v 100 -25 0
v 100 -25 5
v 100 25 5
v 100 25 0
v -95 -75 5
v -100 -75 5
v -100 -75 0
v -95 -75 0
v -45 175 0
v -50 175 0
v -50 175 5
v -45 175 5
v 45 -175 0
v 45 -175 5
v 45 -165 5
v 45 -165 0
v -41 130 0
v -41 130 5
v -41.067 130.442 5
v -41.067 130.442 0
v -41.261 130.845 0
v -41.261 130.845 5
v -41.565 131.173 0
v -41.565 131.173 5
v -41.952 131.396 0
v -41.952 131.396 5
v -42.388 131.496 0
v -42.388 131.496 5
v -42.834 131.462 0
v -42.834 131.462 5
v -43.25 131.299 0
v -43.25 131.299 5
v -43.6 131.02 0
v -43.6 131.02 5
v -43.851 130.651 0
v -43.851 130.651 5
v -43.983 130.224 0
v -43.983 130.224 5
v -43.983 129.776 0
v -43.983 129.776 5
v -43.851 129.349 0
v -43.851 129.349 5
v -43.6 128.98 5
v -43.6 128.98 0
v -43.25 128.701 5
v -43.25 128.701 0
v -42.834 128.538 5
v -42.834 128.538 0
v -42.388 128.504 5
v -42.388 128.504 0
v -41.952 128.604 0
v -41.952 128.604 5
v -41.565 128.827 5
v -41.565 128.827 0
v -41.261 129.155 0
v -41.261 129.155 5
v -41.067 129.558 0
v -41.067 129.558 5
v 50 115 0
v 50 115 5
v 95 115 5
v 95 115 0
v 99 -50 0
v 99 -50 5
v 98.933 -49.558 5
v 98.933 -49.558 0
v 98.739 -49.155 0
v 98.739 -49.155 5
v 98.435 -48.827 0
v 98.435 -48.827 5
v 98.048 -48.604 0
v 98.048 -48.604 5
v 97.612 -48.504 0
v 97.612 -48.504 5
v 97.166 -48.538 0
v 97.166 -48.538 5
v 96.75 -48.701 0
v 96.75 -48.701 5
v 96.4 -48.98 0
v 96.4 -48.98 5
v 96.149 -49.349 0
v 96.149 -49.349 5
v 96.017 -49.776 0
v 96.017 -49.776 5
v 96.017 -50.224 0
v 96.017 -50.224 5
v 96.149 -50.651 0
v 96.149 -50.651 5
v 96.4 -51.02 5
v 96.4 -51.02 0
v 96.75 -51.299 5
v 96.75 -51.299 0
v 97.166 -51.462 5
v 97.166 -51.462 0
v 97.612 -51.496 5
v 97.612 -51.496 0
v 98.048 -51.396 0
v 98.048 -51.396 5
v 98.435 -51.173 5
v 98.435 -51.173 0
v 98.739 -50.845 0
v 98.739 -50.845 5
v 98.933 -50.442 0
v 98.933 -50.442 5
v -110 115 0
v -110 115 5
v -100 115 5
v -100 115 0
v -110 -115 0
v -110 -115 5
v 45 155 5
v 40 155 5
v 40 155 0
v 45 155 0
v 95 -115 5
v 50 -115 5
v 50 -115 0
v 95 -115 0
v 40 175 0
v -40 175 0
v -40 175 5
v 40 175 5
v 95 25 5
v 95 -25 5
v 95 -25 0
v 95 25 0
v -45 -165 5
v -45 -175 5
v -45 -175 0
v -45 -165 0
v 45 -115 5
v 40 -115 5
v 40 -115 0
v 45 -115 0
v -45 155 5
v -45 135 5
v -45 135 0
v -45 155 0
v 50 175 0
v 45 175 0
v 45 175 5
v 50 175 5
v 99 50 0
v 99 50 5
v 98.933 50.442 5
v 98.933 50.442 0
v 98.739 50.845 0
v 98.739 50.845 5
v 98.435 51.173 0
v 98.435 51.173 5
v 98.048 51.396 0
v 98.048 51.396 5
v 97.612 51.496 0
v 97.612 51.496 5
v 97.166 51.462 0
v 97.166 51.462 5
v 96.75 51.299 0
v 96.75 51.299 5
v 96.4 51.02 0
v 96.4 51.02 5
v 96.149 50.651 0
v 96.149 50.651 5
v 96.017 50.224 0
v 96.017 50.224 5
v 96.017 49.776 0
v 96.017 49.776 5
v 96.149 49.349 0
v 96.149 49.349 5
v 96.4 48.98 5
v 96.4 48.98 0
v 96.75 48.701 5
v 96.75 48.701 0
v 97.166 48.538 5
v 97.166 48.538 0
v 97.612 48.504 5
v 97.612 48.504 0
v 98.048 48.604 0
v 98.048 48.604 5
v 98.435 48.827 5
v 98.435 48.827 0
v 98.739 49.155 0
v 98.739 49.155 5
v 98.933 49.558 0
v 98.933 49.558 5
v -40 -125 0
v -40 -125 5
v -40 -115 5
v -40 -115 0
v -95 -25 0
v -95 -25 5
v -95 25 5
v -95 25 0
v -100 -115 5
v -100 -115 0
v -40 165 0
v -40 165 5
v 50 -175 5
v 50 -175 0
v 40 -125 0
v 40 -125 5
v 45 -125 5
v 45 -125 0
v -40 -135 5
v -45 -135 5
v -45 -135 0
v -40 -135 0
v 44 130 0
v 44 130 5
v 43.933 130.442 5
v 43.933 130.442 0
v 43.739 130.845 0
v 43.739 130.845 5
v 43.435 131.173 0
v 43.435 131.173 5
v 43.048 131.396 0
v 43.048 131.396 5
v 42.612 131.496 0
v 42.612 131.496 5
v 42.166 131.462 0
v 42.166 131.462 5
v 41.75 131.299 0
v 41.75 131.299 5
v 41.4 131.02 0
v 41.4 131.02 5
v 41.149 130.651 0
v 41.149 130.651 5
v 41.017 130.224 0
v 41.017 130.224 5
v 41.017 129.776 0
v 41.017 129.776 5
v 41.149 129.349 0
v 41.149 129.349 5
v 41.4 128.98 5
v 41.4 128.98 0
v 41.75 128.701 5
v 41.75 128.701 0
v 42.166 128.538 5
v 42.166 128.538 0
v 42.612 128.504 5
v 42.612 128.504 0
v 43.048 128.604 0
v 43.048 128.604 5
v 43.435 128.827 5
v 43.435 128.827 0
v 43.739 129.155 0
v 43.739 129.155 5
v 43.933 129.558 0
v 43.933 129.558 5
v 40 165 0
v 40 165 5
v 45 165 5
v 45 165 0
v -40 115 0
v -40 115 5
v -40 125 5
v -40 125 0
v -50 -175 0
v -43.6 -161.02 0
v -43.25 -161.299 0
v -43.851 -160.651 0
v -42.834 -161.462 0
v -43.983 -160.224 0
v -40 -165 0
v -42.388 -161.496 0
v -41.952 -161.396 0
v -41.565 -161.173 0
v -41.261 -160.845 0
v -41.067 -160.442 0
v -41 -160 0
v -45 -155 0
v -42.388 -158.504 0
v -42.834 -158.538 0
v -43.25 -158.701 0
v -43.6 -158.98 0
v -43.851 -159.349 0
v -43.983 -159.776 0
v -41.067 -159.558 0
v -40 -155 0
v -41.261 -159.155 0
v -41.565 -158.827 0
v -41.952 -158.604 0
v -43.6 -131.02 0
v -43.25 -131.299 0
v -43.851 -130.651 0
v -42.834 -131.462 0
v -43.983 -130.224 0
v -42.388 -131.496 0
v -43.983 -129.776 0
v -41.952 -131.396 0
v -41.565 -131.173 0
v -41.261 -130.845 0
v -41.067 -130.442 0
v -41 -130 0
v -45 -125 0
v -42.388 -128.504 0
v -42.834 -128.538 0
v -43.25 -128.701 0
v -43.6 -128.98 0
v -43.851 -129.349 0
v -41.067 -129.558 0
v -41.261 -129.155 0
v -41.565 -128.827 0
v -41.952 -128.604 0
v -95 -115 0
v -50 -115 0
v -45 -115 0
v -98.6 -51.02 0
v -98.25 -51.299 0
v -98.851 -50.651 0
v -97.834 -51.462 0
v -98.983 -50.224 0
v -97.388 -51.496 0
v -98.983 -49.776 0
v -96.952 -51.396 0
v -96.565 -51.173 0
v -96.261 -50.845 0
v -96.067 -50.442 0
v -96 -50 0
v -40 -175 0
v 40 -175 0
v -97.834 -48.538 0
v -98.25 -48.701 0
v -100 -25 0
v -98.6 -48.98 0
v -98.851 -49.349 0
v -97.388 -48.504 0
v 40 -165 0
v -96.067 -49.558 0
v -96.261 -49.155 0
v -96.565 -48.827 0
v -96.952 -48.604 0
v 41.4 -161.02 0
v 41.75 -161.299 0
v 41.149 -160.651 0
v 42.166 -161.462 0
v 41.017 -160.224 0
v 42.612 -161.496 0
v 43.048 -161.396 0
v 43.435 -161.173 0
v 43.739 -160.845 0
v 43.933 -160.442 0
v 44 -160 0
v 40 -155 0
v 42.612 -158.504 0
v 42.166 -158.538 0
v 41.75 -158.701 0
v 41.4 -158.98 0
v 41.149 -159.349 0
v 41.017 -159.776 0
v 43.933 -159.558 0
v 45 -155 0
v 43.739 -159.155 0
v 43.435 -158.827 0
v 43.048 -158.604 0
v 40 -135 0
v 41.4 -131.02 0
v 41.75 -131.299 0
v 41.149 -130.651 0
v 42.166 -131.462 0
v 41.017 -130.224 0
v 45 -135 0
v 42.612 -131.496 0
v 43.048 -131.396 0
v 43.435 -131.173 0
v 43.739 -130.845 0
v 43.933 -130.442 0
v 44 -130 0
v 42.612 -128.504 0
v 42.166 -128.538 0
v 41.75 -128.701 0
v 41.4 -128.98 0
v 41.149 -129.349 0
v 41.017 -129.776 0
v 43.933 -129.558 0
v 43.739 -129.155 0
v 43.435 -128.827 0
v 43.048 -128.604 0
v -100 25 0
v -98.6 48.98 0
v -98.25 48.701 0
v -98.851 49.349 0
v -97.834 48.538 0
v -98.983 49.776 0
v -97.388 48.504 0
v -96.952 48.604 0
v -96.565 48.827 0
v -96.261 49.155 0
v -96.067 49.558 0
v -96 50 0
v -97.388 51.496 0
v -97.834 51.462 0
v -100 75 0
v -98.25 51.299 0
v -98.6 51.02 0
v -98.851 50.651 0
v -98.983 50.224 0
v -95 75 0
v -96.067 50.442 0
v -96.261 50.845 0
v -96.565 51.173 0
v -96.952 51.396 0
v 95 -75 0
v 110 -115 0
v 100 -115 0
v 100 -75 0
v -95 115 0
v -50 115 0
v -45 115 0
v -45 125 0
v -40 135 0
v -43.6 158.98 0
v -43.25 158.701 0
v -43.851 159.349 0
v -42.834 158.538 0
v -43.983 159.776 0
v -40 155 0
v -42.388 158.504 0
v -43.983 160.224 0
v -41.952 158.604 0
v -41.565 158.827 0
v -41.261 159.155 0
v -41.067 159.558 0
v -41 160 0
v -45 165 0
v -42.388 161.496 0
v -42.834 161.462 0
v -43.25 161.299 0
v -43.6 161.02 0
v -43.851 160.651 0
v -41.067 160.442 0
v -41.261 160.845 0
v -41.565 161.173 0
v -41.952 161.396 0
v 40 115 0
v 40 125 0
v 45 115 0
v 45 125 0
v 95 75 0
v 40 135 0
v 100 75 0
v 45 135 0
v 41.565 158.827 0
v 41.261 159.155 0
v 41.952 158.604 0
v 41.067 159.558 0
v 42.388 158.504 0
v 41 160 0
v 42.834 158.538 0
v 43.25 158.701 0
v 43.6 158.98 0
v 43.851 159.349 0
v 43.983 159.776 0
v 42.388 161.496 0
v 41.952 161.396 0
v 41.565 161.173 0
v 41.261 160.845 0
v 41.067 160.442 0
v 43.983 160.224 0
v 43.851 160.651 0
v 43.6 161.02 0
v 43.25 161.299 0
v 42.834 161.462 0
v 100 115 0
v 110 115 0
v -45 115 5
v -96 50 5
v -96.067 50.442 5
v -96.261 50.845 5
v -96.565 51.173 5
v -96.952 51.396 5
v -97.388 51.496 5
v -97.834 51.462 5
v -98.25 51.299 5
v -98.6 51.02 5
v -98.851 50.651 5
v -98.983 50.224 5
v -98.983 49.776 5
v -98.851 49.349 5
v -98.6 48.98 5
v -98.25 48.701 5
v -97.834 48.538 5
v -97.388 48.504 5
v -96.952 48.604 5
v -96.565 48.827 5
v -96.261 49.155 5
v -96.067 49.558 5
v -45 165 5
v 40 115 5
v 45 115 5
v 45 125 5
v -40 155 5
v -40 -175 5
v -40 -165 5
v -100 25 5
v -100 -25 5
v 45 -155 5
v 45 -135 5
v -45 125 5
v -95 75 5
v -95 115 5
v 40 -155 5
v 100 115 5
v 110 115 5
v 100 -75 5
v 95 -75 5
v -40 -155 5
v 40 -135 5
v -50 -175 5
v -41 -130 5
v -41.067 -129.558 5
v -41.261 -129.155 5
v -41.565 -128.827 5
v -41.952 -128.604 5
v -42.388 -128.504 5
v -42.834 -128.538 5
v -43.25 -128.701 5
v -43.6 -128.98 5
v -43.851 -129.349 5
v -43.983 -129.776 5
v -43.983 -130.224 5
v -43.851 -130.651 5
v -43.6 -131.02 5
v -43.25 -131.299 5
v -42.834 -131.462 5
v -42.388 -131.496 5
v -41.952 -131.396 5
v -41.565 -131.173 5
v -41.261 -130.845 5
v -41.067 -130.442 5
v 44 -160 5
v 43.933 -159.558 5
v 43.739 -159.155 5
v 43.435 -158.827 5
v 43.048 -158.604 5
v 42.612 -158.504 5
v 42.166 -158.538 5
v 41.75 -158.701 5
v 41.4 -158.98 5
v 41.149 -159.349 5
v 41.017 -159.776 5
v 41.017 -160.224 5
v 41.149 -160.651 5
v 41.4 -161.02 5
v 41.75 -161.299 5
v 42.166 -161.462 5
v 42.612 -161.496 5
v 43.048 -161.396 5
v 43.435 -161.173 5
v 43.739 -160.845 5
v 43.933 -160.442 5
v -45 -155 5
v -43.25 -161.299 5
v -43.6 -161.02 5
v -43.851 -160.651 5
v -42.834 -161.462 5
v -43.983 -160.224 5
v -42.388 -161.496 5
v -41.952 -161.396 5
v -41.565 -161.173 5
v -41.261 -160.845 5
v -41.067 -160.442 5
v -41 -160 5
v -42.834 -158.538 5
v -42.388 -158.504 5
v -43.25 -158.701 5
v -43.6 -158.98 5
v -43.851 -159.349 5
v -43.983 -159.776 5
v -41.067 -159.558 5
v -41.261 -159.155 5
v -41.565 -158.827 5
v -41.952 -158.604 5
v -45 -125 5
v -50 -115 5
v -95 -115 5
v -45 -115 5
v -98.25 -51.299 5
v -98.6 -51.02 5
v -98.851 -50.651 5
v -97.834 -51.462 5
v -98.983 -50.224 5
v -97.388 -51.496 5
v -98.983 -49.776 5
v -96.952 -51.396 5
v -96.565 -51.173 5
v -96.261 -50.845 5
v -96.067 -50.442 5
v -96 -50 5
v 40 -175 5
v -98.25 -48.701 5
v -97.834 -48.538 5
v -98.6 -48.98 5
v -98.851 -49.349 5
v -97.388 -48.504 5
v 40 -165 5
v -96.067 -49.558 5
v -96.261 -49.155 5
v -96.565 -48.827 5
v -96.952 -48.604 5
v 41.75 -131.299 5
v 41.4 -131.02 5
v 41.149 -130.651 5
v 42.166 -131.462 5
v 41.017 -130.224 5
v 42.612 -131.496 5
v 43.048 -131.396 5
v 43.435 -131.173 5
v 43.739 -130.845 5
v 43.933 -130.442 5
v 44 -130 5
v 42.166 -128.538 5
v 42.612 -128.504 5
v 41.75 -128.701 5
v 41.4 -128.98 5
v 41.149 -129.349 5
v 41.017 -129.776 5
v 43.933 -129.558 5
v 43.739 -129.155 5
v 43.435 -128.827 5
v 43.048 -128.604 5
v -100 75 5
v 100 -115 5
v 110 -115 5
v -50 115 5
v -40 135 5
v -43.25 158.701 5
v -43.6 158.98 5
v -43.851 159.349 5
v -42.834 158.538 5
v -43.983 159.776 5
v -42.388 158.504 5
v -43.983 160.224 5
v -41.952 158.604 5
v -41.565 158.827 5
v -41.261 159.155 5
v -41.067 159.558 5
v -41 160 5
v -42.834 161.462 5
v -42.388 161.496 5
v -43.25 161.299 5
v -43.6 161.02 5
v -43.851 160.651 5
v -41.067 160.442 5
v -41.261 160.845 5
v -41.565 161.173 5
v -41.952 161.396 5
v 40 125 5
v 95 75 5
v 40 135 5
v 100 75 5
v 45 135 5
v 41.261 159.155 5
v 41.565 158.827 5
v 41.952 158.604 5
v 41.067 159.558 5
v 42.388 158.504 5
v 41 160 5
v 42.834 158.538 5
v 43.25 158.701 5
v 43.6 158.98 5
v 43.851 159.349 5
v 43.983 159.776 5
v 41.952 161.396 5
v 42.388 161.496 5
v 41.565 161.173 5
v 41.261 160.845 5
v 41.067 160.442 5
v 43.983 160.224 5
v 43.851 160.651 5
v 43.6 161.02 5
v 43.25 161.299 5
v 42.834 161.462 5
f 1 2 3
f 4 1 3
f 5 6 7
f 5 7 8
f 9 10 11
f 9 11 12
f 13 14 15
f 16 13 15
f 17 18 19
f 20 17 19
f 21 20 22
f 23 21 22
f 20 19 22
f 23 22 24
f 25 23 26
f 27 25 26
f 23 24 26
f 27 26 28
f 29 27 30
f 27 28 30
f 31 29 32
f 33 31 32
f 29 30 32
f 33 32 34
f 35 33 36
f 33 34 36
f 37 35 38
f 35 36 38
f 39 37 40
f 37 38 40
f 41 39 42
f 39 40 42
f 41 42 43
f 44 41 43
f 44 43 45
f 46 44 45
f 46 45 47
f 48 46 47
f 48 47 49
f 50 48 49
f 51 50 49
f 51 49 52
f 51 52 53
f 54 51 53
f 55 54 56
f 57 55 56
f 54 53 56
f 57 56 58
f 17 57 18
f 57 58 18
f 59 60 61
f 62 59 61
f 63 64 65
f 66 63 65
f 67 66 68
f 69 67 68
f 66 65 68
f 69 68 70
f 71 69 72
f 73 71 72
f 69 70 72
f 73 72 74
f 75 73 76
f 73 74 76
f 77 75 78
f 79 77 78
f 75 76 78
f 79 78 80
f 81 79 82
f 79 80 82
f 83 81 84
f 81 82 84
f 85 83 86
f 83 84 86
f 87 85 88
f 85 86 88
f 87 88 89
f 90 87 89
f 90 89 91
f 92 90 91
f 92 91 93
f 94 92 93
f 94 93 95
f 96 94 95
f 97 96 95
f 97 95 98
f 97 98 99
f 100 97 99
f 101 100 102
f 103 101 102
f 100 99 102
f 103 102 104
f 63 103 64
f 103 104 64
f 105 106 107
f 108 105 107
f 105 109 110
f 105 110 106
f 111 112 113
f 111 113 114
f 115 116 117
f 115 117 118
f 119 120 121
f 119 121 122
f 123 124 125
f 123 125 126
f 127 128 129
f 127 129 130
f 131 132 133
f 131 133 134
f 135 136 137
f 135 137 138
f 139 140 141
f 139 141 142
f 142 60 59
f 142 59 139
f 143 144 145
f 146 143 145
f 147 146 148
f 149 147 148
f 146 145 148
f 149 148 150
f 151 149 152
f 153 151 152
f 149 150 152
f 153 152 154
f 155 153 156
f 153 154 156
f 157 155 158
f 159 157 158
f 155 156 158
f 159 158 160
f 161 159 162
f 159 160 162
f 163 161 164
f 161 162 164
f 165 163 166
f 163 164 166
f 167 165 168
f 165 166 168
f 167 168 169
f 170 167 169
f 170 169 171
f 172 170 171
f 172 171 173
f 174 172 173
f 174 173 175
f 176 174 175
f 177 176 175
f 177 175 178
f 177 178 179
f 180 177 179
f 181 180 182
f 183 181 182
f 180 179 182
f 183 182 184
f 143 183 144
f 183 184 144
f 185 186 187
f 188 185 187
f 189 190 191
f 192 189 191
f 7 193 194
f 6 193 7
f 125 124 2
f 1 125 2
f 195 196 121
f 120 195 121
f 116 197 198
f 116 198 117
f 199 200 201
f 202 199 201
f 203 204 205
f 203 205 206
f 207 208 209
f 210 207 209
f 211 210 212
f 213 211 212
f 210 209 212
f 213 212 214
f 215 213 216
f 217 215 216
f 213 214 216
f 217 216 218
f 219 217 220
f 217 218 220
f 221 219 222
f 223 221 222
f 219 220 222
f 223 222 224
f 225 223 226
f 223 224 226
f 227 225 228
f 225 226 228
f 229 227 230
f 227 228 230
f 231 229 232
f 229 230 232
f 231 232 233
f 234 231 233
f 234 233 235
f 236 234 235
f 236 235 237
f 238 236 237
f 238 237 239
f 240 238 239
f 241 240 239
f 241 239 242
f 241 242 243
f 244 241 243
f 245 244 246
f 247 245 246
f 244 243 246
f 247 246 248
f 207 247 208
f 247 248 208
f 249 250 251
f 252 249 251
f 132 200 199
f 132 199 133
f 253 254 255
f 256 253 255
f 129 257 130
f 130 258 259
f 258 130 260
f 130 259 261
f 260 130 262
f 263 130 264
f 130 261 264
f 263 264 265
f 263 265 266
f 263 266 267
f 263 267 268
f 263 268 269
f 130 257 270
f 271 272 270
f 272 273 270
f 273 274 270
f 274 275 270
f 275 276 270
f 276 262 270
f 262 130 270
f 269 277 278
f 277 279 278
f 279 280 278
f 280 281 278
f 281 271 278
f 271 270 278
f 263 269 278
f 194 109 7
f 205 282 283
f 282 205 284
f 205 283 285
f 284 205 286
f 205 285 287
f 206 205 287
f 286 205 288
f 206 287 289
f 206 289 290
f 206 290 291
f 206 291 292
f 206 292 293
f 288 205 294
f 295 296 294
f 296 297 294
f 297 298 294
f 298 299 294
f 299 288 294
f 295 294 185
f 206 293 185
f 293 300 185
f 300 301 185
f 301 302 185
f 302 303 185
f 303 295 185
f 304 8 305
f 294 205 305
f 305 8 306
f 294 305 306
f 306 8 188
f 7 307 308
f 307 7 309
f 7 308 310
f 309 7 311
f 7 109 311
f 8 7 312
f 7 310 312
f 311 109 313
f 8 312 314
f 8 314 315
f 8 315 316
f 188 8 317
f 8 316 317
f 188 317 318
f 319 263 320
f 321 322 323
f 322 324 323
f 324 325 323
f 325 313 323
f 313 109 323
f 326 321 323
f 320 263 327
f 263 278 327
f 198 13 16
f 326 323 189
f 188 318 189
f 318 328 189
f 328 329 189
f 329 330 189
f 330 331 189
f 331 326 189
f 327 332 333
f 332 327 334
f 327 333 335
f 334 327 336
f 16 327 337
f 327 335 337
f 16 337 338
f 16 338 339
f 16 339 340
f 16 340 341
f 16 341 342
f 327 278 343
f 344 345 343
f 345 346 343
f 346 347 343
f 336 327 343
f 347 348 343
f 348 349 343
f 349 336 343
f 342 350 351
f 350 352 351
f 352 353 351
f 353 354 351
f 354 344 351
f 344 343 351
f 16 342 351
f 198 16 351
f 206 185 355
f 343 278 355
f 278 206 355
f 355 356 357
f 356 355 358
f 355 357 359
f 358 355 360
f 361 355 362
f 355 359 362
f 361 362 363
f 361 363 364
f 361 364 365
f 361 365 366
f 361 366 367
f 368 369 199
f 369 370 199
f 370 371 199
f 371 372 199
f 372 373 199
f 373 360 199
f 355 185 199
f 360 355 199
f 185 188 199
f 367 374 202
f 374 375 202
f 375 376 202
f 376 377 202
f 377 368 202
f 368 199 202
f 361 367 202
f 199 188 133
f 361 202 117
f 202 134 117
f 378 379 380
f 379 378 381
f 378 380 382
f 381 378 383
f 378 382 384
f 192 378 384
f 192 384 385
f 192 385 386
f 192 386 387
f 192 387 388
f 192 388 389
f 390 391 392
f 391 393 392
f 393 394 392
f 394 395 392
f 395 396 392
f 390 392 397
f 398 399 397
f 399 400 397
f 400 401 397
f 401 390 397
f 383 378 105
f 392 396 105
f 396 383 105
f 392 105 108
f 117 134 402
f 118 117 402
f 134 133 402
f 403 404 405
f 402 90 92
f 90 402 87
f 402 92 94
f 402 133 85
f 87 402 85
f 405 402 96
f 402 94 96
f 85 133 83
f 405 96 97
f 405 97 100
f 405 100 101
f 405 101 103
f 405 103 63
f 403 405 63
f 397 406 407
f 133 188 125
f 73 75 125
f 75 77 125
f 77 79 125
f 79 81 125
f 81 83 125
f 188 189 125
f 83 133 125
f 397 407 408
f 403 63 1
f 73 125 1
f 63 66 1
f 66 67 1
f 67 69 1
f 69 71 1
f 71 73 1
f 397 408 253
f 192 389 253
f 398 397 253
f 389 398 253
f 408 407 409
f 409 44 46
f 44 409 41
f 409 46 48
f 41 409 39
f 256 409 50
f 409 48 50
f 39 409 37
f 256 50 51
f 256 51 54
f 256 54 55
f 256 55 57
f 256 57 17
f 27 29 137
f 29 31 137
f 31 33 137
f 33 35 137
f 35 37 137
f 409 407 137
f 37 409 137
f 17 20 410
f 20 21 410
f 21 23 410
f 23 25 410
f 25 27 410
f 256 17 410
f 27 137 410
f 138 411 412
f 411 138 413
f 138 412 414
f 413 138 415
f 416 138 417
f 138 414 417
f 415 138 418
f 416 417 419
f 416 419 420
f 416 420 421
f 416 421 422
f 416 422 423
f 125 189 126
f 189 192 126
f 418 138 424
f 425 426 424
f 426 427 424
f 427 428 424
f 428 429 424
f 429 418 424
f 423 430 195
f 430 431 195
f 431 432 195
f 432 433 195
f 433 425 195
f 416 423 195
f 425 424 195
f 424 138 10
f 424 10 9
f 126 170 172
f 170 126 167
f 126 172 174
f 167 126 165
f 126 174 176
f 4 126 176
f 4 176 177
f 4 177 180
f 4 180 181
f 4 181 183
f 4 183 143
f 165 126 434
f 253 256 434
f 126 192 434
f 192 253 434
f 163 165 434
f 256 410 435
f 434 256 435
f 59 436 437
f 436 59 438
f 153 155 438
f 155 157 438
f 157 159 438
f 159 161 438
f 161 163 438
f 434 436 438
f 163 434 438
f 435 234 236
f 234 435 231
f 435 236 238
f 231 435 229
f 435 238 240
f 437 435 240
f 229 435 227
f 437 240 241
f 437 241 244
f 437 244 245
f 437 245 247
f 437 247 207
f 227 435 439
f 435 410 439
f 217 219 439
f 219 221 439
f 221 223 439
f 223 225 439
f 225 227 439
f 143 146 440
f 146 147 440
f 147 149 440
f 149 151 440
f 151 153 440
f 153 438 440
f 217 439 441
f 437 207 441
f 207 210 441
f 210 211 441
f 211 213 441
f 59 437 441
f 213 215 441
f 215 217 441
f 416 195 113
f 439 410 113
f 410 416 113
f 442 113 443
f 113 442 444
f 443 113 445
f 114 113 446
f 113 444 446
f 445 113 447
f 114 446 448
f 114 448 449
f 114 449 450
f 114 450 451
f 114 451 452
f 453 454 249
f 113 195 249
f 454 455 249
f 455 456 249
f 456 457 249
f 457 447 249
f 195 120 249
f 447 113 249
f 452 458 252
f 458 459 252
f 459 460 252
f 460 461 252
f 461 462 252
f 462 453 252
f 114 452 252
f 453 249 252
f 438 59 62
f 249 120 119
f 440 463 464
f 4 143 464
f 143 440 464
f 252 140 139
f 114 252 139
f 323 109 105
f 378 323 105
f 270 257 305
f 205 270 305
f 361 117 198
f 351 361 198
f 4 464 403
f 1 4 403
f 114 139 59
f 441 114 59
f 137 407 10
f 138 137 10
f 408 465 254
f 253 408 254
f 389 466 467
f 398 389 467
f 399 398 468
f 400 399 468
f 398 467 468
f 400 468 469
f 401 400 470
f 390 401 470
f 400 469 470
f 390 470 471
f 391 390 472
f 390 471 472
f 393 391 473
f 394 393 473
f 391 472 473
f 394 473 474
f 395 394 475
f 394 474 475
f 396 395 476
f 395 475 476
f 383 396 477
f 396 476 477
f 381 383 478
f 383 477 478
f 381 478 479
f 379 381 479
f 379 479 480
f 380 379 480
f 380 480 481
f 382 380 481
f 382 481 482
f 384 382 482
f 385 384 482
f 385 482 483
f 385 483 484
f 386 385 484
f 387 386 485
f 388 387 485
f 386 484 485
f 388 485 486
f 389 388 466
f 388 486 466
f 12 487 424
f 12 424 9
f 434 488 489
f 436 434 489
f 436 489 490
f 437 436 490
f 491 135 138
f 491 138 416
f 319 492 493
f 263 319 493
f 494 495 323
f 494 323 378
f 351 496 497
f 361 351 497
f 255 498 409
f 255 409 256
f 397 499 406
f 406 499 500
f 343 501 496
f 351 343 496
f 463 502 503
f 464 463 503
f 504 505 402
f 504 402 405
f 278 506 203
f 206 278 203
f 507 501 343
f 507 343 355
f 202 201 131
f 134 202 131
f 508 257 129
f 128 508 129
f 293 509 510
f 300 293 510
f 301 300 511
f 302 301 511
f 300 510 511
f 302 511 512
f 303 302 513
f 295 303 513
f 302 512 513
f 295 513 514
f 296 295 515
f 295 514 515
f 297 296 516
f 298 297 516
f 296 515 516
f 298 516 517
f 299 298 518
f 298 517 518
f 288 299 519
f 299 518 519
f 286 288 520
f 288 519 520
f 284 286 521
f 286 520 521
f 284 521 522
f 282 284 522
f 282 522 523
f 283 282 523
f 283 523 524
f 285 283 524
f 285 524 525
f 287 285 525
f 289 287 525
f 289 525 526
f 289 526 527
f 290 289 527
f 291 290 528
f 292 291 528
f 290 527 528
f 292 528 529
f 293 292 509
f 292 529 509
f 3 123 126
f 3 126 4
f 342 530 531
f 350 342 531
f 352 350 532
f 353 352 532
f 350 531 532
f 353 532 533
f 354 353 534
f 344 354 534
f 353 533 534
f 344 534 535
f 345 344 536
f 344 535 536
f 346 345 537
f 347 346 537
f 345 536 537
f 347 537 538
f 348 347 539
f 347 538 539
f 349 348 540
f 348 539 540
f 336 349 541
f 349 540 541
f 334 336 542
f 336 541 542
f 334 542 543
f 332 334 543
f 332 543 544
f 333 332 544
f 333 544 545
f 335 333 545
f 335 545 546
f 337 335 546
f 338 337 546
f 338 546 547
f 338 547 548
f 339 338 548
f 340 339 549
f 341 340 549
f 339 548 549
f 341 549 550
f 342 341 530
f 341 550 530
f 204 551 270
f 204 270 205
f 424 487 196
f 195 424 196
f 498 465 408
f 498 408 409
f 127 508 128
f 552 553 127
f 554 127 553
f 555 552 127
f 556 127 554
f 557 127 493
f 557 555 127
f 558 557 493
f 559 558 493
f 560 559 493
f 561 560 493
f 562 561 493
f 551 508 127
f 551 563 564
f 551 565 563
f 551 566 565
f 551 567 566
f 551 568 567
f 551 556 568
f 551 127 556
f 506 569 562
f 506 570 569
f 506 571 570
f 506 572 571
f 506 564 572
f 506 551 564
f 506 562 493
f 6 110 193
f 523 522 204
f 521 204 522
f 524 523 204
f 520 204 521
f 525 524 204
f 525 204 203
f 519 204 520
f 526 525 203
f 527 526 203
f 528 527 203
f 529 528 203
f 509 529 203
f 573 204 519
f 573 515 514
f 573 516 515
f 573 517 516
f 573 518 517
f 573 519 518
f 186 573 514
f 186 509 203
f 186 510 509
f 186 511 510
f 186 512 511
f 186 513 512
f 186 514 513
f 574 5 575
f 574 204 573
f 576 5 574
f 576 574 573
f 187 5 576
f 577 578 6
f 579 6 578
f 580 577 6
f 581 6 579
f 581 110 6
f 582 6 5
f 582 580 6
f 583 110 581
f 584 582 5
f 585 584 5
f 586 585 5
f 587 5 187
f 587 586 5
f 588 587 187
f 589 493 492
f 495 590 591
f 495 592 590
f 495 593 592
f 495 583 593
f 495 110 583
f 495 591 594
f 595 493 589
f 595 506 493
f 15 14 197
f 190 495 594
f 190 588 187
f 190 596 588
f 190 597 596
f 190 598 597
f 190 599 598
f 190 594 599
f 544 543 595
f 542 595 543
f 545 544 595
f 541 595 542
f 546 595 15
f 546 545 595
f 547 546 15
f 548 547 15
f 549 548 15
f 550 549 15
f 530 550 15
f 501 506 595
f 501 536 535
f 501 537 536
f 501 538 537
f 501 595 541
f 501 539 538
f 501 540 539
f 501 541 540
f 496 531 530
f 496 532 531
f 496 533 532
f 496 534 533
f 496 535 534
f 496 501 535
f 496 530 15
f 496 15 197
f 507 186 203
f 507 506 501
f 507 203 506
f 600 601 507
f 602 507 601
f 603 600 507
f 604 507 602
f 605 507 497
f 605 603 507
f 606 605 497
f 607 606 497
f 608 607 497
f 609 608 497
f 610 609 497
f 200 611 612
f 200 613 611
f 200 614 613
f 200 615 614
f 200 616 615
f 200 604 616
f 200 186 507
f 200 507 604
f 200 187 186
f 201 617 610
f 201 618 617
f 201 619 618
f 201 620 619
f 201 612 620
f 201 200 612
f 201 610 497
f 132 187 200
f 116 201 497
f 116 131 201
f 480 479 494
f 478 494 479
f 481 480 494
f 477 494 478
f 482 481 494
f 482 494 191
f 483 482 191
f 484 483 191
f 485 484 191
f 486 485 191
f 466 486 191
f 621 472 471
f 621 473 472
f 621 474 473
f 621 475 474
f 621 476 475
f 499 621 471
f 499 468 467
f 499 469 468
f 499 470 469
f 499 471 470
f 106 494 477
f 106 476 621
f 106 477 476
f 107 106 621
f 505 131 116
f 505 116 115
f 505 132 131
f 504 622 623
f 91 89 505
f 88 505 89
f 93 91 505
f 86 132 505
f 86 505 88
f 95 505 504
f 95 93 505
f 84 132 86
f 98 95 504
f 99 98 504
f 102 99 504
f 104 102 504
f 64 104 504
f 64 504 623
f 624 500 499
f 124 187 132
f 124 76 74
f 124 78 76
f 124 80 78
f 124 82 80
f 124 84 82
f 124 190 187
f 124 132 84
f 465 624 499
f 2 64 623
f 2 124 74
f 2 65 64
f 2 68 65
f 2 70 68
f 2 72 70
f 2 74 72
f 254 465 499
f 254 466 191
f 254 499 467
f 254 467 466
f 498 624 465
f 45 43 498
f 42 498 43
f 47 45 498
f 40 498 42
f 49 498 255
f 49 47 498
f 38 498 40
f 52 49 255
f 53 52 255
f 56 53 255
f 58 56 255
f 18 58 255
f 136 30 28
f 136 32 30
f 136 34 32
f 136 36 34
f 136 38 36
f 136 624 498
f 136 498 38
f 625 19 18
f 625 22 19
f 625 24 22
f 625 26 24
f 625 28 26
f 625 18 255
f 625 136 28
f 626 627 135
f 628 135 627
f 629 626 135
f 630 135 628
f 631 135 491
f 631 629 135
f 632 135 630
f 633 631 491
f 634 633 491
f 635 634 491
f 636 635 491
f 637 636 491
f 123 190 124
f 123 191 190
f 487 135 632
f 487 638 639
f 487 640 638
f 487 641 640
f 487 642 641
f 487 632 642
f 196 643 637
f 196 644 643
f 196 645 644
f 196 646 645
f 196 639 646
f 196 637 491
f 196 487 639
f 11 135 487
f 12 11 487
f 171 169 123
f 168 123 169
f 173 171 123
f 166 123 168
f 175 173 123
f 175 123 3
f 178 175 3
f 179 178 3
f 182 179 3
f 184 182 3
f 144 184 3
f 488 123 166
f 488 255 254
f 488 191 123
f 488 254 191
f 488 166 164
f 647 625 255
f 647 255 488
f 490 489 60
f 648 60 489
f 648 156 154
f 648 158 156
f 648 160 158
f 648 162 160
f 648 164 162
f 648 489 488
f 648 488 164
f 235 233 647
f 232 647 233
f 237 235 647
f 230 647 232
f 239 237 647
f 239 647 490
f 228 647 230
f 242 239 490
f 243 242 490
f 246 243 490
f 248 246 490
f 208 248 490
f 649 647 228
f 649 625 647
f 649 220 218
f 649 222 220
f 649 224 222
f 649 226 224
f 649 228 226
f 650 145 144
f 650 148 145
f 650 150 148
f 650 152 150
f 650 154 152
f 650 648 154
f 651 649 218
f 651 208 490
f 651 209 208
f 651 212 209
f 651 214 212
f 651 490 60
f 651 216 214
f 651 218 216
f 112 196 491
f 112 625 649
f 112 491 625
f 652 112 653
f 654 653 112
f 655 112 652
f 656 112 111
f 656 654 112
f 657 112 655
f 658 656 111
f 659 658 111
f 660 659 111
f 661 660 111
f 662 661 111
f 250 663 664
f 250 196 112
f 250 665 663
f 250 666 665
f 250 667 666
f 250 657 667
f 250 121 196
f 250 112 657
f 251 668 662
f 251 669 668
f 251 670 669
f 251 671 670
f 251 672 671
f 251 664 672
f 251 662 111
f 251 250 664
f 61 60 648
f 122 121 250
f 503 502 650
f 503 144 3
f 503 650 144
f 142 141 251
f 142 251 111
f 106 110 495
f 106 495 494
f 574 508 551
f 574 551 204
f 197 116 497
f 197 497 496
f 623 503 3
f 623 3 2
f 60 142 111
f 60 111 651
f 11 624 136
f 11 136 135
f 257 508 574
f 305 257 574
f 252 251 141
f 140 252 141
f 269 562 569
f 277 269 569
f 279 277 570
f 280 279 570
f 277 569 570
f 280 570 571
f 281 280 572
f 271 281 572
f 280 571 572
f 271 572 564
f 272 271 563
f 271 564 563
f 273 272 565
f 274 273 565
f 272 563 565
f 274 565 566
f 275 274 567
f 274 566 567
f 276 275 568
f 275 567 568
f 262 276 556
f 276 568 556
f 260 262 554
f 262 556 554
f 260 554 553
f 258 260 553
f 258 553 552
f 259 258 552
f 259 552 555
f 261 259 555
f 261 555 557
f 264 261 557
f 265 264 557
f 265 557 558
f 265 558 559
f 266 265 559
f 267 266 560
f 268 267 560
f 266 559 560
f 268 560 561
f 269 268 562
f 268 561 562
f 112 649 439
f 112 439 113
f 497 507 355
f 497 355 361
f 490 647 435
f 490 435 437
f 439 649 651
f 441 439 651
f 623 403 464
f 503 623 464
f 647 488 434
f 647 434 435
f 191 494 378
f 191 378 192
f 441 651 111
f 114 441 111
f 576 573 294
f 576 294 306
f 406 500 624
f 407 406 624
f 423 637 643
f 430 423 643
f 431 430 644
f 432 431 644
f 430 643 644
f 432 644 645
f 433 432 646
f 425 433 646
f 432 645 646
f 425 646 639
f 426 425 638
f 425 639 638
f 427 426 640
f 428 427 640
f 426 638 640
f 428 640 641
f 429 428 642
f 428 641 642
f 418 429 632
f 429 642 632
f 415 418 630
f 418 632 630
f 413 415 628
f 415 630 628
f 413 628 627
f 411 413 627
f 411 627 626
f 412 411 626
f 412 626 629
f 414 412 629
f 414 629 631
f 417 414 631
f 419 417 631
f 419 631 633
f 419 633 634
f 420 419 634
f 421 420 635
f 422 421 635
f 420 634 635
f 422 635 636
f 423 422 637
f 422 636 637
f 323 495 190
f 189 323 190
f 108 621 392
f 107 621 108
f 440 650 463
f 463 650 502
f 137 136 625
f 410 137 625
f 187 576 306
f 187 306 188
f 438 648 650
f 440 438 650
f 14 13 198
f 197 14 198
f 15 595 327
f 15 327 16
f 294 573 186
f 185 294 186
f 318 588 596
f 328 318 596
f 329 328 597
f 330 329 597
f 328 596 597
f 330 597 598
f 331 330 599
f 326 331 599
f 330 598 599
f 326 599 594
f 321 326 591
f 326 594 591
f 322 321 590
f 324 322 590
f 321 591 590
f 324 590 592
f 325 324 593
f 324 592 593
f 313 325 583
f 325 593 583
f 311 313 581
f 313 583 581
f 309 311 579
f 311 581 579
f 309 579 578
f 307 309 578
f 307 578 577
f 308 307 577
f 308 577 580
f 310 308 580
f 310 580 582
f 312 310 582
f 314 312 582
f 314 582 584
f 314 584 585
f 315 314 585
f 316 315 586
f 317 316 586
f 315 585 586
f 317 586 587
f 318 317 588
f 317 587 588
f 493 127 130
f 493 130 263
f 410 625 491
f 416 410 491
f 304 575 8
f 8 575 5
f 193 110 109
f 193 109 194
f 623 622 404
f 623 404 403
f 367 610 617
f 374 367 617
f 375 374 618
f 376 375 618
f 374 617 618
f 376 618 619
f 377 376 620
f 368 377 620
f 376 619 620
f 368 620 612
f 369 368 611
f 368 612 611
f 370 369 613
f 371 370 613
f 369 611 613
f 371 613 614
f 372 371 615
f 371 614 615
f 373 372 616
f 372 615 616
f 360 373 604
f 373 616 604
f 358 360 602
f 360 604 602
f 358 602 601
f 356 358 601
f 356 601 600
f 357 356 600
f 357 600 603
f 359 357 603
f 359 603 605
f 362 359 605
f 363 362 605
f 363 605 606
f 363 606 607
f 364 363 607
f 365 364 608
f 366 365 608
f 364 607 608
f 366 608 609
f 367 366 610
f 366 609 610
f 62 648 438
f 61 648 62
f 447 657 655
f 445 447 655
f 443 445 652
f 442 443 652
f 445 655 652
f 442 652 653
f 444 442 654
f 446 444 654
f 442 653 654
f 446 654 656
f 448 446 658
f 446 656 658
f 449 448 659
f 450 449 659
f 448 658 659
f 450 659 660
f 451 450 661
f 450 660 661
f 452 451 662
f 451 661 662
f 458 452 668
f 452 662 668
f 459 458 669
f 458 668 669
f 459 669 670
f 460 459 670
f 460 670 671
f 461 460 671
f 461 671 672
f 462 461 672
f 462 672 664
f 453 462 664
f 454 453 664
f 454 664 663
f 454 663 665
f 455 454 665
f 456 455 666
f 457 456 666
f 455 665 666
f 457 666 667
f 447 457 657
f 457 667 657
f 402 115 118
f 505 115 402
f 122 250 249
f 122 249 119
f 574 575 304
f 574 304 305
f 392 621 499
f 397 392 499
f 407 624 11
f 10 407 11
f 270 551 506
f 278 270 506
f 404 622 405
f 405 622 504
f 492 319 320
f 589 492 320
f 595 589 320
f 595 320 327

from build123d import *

# Parameters (mm, degrees)
SKETCH1_W           = 220
SKETCH1_H           = 350
BOSS_EXTRUDE1_DEPTH = 5
SKETCH2_W           = 60
SKETCH2_H           = 60
CUT_EXTRUDE2_DEPTH  = 5
SKETCH3_W           = 5
SKETCH3_H           = 10
SKETCH3_H_2         = 20
CUT_EXTRUDE3_DEPTH  = 5
SKETCH4_R           = 1.5
CUT_EXTRUDE4_DEPTH  = 5
SKETCH5_W           = 5
SKETCH5_H           = 40
SKETCH5_H_2         = 50
CUT_EXTRUDE5_DEPTH  = 5
SKETCH6_R           = 1.5
CUT_EXTRUDE6_DEPTH  = 5


with BuildPart() as part:
    # Sketch1 → Boss-Extrude1 (new body)
    with BuildSketch(Plane.XY):
        Rectangle(SKETCH1_W, SKETCH1_H)
    extrude(amount=BOSS_EXTRUDE1_DEPTH)

    # Sketch2 → Cut-Extrude2 (cut)
    with BuildSketch(Plane.XY.offset(5)):
        with Locations((-80, -145)):
            Rectangle(SKETCH2_W, SKETCH2_H)
        with Locations((80, -145)):
            Rectangle(SKETCH2_W, SKETCH2_H)
        with Locations((80, 145)):
            Rectangle(SKETCH2_W, SKETCH2_H)
        with Locations((-80, 145)):
            Rectangle(SKETCH2_W, SKETCH2_H)
    extrude(amount=-CUT_EXTRUDE2_DEPTH, mode=Mode.SUBTRACT)

    # Sketch3 → Cut-Extrude3 (cut)
    with BuildSketch(Plane.XY.offset(5)):
        with Locations((42.5, 170)):
            Rectangle(SKETCH3_W, SKETCH3_H)
        with Locations((42.5, 145)):
            Rectangle(SKETCH3_W, SKETCH3_H_2)
        with Locations((42.5, 120)):
            Rectangle(SKETCH3_W, SKETCH3_H)
        with Locations((-42.5, 170)):
            Rectangle(SKETCH3_W, SKETCH3_H)
        with Locations((-42.5, 145)):
            Rectangle(SKETCH3_W, SKETCH3_H_2)
        with Locations((-42.5, 120)):
            Rectangle(SKETCH3_W, SKETCH3_H)
        with Locations((42.5, -120)):
            Rectangle(SKETCH3_W, SKETCH3_H)
        with Locations((42.5, -145)):
            Rectangle(SKETCH3_W, SKETCH3_H_2)
        with Locations((42.5, -170)):
            Rectangle(SKETCH3_W, SKETCH3_H)
        with Locations((-42.5, -120)):
            Rectangle(SKETCH3_W, SKETCH3_H)
        with Locations((-42.5, -145)):
            Rectangle(SKETCH3_W, SKETCH3_H_2)
        with Locations((-42.5, -170)):
            Rectangle(SKETCH3_W, SKETCH3_H)
    extrude(amount=-CUT_EXTRUDE3_DEPTH, mode=Mode.SUBTRACT)

    # Sketch4 → Cut-Extrude4 (cut)
    with BuildSketch(Plane.XY.offset(5)):
        with Locations((-42.5, 160)):
            Circle(SKETCH4_R)
        with Locations(Location((42.5, 160, 0), (0, 0, 180))):
            Circle(SKETCH4_R)
        with Locations((-42.5, 130)):
            Circle(SKETCH4_R)
        with Locations((42.5, 130)):
            Circle(SKETCH4_R)
        with Locations((-42.5, -160)):
            Circle(SKETCH4_R)
        with Locations((-42.5, -130)):
            Circle(SKETCH4_R)
        with Locations((42.5, -130)):
            Circle(SKETCH4_R)
        with Locations((42.5, -160)):
            Circle(SKETCH4_R)
    extrude(amount=-CUT_EXTRUDE4_DEPTH, mode=Mode.SUBTRACT)

    # Sketch5 → Cut-Extrude5 (cut)
    with BuildSketch(Plane.XY.offset(5)):
        with Locations((-97.5, -95)):
            Rectangle(SKETCH5_W, SKETCH5_H)
        with Locations((-97.5, 0)):
            Rectangle(SKETCH5_W, SKETCH5_H_2)
        with Locations((-97.5, 95)):
            Rectangle(SKETCH5_W, SKETCH5_H)
        with Locations((97.5, 95)):
            Rectangle(SKETCH5_W, SKETCH5_H)
        with Locations((97.5, 0)):
            Rectangle(SKETCH5_W, SKETCH5_H_2)
        with Locations((97.5, -95)):
            Rectangle(SKETCH5_W, SKETCH5_H)
    extrude(amount=-CUT_EXTRUDE5_DEPTH, mode=Mode.SUBTRACT)

    # Sketch6 → Cut-Extrude6 (cut)
    with BuildSketch(Plane.XY.offset(5)):
        with Locations((-97.5, 50)):
            Circle(SKETCH6_R)
        with Locations((-97.5, -50)):
            Circle(SKETCH6_R)
        with Locations((97.5, 50)):
            Circle(SKETCH6_R)
        with Locations((97.5, -50)):
            Circle(SKETCH6_R)
    extrude(amount=-CUT_EXTRUDE6_DEPTH, mode=Mode.SUBTRACT)


solid = part.part
